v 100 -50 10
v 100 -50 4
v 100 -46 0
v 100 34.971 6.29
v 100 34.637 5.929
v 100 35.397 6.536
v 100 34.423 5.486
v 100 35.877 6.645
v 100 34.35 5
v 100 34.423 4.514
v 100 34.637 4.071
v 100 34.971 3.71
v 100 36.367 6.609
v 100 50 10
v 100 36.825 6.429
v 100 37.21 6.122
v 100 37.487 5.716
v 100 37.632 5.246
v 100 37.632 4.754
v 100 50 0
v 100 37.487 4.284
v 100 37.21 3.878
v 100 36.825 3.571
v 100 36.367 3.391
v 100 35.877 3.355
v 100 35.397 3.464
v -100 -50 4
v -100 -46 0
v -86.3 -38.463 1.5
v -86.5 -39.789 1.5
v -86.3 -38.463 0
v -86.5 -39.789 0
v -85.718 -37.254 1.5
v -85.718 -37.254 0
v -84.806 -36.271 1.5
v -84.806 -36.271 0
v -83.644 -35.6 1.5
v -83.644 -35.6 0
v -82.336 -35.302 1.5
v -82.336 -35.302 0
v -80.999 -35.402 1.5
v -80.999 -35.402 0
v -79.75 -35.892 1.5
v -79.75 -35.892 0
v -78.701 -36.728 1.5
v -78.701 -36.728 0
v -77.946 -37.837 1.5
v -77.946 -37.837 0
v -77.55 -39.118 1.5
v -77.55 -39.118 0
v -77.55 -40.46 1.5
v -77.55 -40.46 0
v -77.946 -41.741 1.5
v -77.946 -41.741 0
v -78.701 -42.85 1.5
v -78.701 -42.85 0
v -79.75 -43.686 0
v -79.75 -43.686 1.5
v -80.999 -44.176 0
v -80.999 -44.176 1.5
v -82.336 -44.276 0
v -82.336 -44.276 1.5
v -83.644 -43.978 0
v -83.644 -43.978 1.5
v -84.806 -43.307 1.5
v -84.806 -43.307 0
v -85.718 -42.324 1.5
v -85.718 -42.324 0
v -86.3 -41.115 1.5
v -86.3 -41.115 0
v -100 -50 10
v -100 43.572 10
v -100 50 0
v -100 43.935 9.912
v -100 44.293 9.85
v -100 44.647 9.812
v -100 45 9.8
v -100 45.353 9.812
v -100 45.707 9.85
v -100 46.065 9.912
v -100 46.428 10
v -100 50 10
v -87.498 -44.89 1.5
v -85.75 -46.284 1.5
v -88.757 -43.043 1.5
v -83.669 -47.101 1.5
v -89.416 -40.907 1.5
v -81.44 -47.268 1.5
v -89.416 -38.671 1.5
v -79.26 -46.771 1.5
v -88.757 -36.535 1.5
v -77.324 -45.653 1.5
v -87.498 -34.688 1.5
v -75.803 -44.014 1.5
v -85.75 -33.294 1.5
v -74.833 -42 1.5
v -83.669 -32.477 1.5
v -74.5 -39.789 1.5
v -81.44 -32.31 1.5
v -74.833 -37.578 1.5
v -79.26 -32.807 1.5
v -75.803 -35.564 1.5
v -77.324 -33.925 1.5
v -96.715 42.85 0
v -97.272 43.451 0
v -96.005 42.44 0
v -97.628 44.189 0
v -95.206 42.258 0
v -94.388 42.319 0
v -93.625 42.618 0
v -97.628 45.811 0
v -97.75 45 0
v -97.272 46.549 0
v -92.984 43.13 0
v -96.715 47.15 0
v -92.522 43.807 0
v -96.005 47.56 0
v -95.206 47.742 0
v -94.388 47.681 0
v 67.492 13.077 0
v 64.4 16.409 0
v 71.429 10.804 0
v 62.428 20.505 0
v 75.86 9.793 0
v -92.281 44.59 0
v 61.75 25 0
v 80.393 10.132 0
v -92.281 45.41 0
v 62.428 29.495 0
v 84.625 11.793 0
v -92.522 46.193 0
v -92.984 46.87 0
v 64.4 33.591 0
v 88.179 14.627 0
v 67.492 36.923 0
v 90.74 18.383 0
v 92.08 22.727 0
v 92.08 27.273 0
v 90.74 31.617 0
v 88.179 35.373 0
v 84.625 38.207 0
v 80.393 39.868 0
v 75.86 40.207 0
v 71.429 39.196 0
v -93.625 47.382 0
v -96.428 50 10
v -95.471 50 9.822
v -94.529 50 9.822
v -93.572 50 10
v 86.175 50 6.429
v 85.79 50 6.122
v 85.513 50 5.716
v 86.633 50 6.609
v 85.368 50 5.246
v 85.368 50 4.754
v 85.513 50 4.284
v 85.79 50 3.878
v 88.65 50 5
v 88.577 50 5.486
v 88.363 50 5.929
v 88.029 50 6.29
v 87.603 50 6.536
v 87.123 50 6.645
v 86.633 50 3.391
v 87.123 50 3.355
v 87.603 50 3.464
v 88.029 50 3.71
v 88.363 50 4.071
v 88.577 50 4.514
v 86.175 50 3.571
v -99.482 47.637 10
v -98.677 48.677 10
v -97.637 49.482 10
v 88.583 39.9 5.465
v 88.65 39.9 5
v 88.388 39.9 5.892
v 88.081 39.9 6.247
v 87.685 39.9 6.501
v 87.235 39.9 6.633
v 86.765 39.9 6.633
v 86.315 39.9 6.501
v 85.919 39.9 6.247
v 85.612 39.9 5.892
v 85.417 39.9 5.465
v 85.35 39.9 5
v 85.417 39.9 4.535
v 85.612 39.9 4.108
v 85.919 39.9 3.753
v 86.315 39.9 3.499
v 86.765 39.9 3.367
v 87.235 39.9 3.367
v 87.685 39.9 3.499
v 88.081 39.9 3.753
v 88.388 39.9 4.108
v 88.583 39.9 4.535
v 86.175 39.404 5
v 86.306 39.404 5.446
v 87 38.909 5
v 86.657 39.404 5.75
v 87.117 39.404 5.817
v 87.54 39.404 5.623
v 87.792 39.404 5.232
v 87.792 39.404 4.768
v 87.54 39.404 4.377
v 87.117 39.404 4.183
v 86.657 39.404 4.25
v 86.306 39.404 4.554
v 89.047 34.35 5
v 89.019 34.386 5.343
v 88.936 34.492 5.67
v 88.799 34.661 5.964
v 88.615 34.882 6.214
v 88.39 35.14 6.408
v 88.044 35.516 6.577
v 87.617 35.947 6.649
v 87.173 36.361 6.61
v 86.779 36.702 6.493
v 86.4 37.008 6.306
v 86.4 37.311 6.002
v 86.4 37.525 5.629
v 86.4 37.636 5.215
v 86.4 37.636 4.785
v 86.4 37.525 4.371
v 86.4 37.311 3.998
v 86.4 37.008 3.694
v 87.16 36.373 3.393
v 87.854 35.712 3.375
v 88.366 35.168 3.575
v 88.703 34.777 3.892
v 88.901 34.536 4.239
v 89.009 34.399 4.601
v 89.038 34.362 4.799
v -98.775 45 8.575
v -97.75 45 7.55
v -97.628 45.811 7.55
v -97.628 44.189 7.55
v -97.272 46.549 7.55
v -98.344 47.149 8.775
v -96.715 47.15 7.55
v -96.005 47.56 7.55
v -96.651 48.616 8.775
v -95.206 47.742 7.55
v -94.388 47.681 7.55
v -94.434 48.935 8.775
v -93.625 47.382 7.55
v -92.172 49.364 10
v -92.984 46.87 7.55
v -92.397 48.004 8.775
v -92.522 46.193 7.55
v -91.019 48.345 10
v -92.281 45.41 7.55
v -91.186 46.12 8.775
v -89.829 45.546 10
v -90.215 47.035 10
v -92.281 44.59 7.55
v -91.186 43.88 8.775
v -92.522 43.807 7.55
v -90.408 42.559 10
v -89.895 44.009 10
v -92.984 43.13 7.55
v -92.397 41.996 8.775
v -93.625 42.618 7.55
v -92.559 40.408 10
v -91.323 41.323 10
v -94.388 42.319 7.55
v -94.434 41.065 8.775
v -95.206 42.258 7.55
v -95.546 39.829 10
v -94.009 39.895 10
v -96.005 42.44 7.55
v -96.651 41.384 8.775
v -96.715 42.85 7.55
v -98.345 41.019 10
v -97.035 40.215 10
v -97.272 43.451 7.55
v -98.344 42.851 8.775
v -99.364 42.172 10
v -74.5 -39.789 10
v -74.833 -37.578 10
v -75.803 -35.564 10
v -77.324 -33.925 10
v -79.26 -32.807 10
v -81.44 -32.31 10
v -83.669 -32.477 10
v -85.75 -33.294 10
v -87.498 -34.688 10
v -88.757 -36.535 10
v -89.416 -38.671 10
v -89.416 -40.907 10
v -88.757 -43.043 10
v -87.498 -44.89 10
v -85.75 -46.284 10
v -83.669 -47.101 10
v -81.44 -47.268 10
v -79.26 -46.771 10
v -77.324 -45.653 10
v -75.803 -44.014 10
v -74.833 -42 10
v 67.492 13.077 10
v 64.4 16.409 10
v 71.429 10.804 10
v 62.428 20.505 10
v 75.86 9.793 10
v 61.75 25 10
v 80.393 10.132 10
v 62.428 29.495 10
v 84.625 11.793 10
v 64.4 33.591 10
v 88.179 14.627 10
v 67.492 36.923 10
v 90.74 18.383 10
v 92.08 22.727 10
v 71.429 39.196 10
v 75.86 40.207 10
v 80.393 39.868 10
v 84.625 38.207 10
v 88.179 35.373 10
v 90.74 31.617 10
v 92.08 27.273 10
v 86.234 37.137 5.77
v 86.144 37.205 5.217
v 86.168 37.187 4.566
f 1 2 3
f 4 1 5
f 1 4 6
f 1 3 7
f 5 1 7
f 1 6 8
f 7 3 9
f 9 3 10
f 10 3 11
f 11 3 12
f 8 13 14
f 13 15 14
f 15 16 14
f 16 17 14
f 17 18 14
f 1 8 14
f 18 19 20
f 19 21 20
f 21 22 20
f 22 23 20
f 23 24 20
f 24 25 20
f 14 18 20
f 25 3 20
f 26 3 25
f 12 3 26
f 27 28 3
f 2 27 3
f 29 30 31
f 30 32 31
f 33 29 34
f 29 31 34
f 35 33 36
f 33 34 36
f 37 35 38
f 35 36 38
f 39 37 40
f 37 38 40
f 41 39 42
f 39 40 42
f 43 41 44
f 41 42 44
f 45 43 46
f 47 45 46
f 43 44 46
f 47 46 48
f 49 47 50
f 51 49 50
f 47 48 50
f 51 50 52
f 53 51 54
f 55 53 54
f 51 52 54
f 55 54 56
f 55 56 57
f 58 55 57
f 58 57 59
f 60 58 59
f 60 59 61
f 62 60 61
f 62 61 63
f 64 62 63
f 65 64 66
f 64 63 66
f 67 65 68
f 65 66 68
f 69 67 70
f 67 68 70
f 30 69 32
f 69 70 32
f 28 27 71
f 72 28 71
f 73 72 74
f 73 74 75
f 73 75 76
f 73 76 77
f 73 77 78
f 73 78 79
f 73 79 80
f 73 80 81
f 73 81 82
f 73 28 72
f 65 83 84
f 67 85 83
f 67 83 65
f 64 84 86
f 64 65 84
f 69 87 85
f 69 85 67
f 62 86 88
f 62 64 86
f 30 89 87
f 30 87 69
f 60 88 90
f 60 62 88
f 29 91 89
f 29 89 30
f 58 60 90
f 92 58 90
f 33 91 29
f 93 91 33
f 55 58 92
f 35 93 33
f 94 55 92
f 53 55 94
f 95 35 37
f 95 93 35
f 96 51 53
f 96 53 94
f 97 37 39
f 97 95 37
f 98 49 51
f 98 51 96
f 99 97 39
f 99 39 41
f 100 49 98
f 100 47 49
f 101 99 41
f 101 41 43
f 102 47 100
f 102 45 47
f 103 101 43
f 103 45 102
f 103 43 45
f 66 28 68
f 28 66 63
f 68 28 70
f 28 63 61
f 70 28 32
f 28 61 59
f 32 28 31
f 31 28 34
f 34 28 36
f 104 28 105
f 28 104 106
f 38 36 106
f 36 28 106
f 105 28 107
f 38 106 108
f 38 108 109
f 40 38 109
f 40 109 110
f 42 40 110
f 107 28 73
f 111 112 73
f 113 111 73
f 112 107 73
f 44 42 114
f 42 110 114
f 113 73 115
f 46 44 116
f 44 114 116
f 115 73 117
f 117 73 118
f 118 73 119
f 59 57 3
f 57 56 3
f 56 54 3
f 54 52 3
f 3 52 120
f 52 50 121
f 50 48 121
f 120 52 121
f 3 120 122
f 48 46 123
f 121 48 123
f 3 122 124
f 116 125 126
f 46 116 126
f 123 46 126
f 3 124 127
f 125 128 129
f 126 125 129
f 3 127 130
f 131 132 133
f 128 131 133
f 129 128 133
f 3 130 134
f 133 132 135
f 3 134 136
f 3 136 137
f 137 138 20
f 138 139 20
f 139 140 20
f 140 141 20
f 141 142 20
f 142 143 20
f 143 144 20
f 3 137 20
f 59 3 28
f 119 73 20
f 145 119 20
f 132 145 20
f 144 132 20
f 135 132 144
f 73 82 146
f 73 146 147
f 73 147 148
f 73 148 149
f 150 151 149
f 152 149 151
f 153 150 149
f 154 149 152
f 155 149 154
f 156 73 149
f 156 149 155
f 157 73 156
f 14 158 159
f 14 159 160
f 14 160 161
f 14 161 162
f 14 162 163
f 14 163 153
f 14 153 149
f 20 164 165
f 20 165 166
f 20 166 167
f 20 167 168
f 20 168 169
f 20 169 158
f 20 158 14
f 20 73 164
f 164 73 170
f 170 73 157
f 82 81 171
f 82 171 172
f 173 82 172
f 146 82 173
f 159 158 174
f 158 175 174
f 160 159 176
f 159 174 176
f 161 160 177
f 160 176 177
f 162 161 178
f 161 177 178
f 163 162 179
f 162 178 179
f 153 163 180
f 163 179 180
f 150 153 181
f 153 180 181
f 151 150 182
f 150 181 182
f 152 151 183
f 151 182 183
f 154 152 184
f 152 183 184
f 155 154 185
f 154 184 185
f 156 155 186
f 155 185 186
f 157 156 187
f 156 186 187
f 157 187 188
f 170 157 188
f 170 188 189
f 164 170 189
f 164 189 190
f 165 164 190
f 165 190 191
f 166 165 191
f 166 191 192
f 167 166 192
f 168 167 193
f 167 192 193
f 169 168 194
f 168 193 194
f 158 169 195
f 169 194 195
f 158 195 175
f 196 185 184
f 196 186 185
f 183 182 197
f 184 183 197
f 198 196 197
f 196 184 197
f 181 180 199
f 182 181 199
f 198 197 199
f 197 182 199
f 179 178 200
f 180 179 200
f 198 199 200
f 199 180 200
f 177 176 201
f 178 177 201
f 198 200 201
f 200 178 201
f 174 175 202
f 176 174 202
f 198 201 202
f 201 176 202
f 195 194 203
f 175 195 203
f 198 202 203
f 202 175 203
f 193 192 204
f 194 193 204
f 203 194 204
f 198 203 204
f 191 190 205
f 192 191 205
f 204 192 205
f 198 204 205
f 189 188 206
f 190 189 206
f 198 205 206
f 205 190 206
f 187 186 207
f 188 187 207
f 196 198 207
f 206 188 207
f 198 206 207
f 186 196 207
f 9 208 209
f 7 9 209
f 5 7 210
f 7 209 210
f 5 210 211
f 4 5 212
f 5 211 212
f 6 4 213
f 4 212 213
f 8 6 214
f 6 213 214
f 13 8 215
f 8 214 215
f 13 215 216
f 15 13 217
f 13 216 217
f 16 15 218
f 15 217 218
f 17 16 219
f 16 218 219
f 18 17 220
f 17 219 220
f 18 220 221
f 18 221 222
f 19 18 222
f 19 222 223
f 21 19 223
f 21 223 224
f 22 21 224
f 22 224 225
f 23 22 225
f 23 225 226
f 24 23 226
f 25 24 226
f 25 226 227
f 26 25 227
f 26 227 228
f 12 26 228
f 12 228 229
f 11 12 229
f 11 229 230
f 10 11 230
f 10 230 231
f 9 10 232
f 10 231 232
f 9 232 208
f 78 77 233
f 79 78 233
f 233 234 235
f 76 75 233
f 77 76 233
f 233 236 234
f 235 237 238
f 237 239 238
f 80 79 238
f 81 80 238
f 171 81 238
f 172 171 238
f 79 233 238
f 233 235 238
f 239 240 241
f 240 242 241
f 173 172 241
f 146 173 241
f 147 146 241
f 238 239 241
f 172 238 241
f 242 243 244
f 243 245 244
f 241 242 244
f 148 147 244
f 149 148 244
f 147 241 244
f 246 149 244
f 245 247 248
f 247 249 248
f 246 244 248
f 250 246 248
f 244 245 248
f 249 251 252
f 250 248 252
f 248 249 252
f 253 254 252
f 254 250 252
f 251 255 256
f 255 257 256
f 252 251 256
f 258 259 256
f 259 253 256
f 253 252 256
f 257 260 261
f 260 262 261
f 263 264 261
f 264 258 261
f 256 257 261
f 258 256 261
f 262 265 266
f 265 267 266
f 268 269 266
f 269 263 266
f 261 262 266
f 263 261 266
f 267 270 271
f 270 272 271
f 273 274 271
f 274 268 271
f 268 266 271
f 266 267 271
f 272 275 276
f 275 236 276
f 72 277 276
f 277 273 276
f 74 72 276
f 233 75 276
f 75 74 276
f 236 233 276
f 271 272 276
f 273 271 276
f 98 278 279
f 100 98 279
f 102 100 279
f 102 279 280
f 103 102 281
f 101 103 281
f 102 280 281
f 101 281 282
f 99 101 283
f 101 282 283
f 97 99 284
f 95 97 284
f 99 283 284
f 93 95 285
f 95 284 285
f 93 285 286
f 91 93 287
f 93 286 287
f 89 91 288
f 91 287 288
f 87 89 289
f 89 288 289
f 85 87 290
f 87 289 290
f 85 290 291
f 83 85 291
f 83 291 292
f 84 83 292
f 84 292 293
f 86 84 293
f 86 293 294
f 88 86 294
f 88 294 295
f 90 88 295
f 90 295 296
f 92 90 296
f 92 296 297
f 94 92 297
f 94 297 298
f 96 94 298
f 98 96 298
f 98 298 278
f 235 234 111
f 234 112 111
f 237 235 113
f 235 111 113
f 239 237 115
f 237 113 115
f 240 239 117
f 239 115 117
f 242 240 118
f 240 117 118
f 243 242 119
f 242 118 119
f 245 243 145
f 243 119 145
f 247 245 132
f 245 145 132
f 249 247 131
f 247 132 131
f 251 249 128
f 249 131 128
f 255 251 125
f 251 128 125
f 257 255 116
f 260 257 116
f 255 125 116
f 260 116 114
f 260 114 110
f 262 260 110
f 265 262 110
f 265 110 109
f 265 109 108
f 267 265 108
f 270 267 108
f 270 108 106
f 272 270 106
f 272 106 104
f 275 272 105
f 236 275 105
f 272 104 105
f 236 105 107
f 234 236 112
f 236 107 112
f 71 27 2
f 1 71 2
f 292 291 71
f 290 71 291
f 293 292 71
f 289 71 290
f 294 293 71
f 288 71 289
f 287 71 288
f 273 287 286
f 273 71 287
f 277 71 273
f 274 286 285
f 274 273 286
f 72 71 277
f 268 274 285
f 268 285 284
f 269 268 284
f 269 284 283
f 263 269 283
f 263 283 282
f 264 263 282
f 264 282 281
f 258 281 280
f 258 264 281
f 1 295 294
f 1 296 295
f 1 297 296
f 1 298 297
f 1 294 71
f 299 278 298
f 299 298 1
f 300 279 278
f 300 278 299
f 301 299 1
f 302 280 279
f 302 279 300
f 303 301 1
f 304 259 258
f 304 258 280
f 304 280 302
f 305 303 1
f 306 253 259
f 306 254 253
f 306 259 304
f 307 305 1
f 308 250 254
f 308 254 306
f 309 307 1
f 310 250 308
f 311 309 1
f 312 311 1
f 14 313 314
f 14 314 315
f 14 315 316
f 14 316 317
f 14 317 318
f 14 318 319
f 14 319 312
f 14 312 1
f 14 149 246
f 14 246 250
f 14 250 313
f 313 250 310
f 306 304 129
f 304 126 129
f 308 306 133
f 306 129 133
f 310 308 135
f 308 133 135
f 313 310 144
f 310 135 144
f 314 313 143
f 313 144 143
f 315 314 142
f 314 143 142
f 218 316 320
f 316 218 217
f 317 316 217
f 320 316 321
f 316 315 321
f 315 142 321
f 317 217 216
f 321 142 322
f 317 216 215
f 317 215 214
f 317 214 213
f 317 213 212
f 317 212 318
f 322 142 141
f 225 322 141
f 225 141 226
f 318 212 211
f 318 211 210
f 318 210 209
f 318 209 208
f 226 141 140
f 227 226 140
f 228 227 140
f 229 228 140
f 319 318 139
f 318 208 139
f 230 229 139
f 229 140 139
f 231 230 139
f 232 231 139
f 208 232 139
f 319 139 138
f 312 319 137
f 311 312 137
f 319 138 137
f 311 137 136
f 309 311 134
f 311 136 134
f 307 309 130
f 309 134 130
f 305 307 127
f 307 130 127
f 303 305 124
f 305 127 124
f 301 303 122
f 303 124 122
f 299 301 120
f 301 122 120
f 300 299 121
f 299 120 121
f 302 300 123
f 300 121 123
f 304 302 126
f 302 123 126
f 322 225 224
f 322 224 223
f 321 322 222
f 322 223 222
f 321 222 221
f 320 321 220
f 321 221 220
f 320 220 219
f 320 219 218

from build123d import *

# Parameters (mm, degrees)
F0_W           = 200
F0_H           = 100
F1_DEPTH       = 10
F2_SIZE        = 4
F4_D           = 9
F4_DEPTH       = 10
F4_CBORE_D     = 15
F4_CBORE_DEPTH = 8.5
F4_TIP         = 2.7038727856
F6_D           = 5.5
F6_DEPTH       = 10
F6_CSINK_D     = 10.4
F6_CSINK_ANGLE = 90
F6_TIP         = 1.6523667023
F8_D           = 30.5
F8_DEPTH       = 10
F8_TIP         = 9.1631244402
F10_D          = 3.3
F10_DEPTH      = 13.6
F10_TIP        = 0.9914200214
F12_D          = 3.3
F12_DEPTH      = 10.1
F12_TIP        = 0.9914200214


with BuildPart() as f1:
    # F0 (on Top) → F1 (new body)
    with BuildSketch(Plane.XY):
        Rectangle(F0_W, F0_H)
    extrude(amount=F1_DEPTH)

    # F2
    f2_edges = [f1.edges().sort_by_distance(p)[0] for p in [
        (0, -50, 0),
    ]]
    chamfer(f2_edges, length=F2_SIZE)

    # F4
    with Locations(Plane.XY.offset(10)):
        with Locations((-82, -39.789)):
            CounterBoreHole(F4_D / 2, F4_CBORE_D / 2, F4_CBORE_DEPTH, depth=F4_DEPTH)
            with Locations((0, 0, -(F4_DEPTH + F4_TIP / 2))):  # 118° drill point
                Cone(0, F4_D / 2, F4_TIP, mode=Mode.SUBTRACT)

    # F6
    with Locations(Plane.XY.offset(10)):
        with Locations((-95, 45)):
            CounterSinkHole(F6_D / 2, F6_CSINK_D / 2, depth=F6_DEPTH, counter_sink_angle=F6_CSINK_ANGLE)
            with Locations((0, 0, -(F6_DEPTH + F6_TIP / 2))):  # 118° drill point
                Cone(0, F6_D / 2, F6_TIP, mode=Mode.SUBTRACT)

    # F8
    with Locations(Plane.XY.offset(10)):
        with Locations((77, 25)):
            Hole(F8_D / 2, depth=F8_DEPTH)
            with Locations((0, 0, -(F8_DEPTH + F8_TIP / 2))):  # 118° drill point
                Cone(0, F8_D / 2, F8_TIP, mode=Mode.SUBTRACT)

    # F10
    with Locations(Plane.YZ.offset(100)):
        with Locations((36, 5)):
            Hole(F10_D / 2, depth=F10_DEPTH)
            with Locations((0, 0, -(F10_DEPTH + F10_TIP / 2))):  # 118° drill point
                Cone(0, F10_D / 2, F10_TIP, mode=Mode.SUBTRACT)

    # F12
    with Locations(Plane(origin=(0, 50, 0), x_dir=(-1, 0, 0), z_dir=(0, 1, 0))):
        with Locations((-87, 5)):
            Hole(F12_D / 2, depth=F12_DEPTH)
            with Locations((0, 0, -(F12_DEPTH + F12_TIP / 2))):  # 118° drill point
                Cone(0, F12_D / 2, F12_TIP, mode=Mode.SUBTRACT)


solid = f1.part
